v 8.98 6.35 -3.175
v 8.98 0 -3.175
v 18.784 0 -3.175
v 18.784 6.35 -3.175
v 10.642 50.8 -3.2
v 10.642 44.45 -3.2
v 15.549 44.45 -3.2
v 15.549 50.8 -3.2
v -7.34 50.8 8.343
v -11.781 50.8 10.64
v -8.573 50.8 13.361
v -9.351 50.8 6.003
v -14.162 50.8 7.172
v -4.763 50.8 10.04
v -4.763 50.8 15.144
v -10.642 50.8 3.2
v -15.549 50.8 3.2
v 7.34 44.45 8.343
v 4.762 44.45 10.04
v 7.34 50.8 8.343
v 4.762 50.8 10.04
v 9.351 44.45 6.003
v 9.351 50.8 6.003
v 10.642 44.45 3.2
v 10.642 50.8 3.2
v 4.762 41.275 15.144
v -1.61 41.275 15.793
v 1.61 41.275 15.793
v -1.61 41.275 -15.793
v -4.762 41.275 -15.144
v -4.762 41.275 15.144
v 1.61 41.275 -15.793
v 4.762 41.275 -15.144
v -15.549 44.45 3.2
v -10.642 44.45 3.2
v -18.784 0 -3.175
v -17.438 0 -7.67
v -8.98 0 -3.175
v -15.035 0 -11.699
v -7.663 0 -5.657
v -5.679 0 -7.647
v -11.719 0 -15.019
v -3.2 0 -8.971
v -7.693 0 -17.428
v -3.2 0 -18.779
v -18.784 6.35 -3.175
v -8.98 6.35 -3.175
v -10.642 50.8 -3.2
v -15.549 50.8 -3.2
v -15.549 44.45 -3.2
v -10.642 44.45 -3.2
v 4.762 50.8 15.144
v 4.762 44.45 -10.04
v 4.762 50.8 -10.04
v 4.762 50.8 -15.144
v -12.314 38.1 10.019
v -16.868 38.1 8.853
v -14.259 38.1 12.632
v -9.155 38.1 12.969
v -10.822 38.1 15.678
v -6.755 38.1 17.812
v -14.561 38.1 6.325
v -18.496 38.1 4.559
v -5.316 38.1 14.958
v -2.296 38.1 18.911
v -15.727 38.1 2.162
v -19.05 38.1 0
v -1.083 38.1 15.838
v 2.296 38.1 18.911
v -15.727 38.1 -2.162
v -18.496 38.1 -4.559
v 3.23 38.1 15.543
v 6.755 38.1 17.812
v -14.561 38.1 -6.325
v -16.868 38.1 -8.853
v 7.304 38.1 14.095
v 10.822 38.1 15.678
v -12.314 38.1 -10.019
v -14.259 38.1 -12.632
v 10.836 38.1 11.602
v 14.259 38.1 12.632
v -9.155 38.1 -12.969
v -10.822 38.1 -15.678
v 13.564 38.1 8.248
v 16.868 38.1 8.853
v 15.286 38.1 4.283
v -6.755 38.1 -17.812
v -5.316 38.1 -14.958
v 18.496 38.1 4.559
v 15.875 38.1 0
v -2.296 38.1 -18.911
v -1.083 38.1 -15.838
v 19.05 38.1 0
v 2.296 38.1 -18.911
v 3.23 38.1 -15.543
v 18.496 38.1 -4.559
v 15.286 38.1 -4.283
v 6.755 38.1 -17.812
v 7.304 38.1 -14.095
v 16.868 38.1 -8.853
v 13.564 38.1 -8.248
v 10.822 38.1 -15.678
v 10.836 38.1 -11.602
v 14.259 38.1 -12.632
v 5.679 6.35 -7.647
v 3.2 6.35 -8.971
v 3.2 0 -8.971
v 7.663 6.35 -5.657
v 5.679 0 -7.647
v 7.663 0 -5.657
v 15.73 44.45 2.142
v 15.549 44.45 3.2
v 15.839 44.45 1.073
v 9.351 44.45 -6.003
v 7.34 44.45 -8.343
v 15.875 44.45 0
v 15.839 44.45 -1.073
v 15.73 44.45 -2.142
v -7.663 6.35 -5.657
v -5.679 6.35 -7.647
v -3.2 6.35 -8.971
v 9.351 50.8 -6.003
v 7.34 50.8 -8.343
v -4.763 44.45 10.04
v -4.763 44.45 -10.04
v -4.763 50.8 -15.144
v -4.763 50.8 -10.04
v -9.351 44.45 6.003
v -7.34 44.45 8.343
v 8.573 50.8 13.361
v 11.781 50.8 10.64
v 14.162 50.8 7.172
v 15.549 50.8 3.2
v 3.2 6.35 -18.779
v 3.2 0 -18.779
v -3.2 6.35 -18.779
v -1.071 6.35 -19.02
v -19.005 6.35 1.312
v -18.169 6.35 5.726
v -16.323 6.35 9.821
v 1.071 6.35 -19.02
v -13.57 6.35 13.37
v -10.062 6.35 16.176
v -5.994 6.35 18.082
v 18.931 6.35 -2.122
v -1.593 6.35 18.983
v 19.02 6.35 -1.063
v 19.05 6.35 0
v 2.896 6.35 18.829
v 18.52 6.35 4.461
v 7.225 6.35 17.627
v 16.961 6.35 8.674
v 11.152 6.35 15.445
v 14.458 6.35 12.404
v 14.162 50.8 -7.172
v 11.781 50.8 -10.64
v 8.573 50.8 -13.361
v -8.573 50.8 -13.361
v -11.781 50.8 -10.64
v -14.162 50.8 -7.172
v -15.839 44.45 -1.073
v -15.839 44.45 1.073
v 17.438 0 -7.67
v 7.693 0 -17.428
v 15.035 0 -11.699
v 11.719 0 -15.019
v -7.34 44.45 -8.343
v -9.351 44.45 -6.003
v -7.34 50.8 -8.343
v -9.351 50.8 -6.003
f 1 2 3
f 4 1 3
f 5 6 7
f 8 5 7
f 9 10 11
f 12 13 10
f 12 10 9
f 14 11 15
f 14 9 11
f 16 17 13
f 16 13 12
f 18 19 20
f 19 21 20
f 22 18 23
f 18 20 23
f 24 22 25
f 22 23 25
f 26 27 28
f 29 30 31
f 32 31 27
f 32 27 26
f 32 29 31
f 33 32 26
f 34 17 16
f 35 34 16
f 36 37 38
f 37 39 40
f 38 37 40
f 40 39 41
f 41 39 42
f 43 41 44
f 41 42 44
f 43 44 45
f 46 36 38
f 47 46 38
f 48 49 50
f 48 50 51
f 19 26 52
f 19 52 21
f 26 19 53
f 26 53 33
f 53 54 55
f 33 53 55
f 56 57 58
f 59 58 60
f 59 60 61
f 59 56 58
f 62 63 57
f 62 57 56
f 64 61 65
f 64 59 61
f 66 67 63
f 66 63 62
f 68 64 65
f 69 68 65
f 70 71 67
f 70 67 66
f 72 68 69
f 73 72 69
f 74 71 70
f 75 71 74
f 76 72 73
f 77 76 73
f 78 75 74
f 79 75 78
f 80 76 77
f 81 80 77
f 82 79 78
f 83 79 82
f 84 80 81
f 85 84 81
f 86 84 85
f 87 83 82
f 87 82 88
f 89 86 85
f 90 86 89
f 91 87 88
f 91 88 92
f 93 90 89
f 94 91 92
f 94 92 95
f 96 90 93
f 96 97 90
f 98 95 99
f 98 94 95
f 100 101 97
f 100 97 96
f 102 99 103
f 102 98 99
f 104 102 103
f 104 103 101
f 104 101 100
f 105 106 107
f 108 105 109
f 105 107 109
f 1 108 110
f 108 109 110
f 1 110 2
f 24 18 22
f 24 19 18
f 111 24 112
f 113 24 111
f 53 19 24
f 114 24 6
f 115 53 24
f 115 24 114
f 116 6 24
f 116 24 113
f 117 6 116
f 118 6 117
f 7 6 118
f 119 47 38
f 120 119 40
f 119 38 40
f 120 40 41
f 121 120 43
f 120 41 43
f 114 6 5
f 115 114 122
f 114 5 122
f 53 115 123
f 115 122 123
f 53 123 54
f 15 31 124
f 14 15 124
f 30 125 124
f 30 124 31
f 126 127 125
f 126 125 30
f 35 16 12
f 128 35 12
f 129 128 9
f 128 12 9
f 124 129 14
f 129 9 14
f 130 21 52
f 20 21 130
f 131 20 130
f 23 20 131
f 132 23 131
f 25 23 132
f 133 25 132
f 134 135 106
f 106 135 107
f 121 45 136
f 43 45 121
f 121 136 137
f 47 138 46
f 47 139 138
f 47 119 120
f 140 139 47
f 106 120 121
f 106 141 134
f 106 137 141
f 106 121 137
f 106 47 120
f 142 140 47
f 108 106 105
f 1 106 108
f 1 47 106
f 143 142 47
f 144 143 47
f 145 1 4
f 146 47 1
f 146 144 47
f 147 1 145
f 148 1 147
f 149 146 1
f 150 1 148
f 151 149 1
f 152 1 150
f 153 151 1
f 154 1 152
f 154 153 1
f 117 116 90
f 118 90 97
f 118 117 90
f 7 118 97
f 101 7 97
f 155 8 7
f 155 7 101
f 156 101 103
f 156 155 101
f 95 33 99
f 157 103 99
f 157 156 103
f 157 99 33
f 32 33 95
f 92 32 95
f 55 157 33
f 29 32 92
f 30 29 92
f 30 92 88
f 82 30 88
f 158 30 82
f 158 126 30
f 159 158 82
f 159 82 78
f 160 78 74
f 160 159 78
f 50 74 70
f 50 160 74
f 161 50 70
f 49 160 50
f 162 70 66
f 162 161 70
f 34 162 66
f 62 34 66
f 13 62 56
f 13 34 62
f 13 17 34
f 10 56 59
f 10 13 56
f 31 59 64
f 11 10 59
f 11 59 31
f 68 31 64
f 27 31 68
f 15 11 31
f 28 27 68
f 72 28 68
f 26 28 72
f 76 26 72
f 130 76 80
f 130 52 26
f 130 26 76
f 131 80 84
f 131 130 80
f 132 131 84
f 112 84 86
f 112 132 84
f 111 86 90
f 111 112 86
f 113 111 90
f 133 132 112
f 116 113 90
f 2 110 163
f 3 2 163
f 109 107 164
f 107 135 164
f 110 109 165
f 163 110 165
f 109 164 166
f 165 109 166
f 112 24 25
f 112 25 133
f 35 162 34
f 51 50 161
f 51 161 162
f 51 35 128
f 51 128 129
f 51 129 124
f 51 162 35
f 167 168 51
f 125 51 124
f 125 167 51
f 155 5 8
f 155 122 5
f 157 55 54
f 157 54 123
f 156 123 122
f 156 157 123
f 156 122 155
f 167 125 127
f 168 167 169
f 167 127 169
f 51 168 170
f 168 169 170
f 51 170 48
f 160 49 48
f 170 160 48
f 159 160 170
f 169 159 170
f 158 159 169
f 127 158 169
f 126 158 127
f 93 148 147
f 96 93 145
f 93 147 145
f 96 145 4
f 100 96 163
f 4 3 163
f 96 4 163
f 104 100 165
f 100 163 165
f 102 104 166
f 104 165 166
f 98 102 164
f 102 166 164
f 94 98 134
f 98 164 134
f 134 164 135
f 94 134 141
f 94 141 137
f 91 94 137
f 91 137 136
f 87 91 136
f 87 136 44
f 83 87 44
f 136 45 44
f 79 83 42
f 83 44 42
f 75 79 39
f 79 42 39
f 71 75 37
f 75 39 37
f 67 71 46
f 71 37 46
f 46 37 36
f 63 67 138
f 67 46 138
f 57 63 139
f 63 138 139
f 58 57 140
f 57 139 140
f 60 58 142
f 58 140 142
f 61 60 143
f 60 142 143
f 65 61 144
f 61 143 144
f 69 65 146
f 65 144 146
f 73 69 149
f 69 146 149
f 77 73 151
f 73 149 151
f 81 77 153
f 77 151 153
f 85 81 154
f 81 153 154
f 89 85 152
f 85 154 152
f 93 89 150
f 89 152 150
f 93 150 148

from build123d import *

# Parameters (mm, degrees)
SKETCH1_R                              = 19.05
F_1_5_DIAMETER_2_TALL_CYLINDER_DEPTH   = 50.8
SKETCH2_R                              = 19.05
SKETCH2_R_2                            = 15.875
F_1_25_DIAMETER_X_5_CYLINDER_CUT_DEPTH = 12.7
SKETCH3_R                              = 11.1125
CUT_EXTRUDE2_DEPTH                     = 6.35
SKETCH4_W                              = 9.525
SKETCH4_H                              = 38.1
CUT_EXTRUDE3_DEPTH                     = 9.525
SKETCH5_W                              = 38.1
SKETCH5_H                              = 6.4008
CUT_EXTRUDE4_DEPTH                     = 6.35
SKETCH11_R                             = 9.525
CUT_EXTRUDE5_DEPTH                     = 6.35
SKETCH12_W                             = 6.4008
SKETCH12_H                             = 19.05
CUT_EXTRUDE6_DEPTH                     = 6.35
SKETCH13_W                             = 38.1
SKETCH13_H                             = 22.225
CUT_EXTRUDE7_DEPTH                     = 6.35


with BuildPart() as part:
    # Sketch1 → 1.5" diameter 2" tall cylinder (new body)
    with BuildSketch(Plane(origin=(0, 0, 0), x_dir=(1, 0, 0), z_dir=(0, 1, 0))):
        Circle(SKETCH1_R)
    extrude(amount=F_1_5_DIAMETER_2_TALL_CYLINDER_DEPTH)

    # Sketch2 → 1.25" diameter x .5" cylinder cut (cut)
    with BuildSketch(Plane(origin=(0, 50.8, 0), x_dir=(1, 0, 0), z_dir=(0, 1, 0))):
        Circle(SKETCH2_R)
        Circle(SKETCH2_R_2, mode=Mode.SUBTRACT)
    extrude(amount=-F_1_25_DIAMETER_X_5_CYLINDER_CUT_DEPTH, mode=Mode.SUBTRACT)

    # Sketch3 → Cut-Extrude2 (cut)
    with BuildSketch(Plane(origin=(0, 50.8, 0), x_dir=(1, 0, 0), z_dir=(0, 1, 0))):
        Circle(SKETCH3_R)
    extrude(amount=-CUT_EXTRUDE2_DEPTH, mode=Mode.SUBTRACT)

    # Sketch4 → Cut-Extrude3 (cut)
    with BuildSketch(Plane(origin=(0, 50.8, 0), x_dir=(1, 0, 0), z_dir=(0, 1, 0))):
        Rectangle(SKETCH4_W, SKETCH4_H)
    extrude(amount=-CUT_EXTRUDE3_DEPTH, mode=Mode.SUBTRACT)

    # Sketch5 → Cut-Extrude4 (cut)
    with BuildSketch(Plane(origin=(0, 50.8, 0), x_dir=(1, 0, 0), z_dir=(0, 1, 0))):
        Rectangle(SKETCH5_W, SKETCH5_H)
    extrude(amount=-CUT_EXTRUDE4_DEPTH, mode=Mode.SUBTRACT)

    # Sketch11 → Cut-Extrude5 (cut)
    with BuildSketch(Plane(origin=(0, 0, 0), x_dir=(-1, 0, 0), z_dir=(0, -1, 0))):
        Circle(SKETCH11_R)
    extrude(amount=-CUT_EXTRUDE5_DEPTH, mode=Mode.SUBTRACT)

    # Sketch12 → Cut-Extrude6 (cut)
    with BuildSketch(Plane.XZ):
        with Locations((0, -9.525)):
            Rectangle(SKETCH12_W, SKETCH12_H)
    extrude(amount=-CUT_EXTRUDE6_DEPTH, mode=Mode.SUBTRACT)

    # Sketch13 → Cut-Extrude7 (cut)
    with BuildSketch(Plane.XZ):
        with Locations((0, 7.9375)):
            Rectangle(SKETCH13_W, SKETCH13_H)
    extrude(amount=-CUT_EXTRUDE7_DEPTH, mode=Mode.SUBTRACT)


solid = part.part
